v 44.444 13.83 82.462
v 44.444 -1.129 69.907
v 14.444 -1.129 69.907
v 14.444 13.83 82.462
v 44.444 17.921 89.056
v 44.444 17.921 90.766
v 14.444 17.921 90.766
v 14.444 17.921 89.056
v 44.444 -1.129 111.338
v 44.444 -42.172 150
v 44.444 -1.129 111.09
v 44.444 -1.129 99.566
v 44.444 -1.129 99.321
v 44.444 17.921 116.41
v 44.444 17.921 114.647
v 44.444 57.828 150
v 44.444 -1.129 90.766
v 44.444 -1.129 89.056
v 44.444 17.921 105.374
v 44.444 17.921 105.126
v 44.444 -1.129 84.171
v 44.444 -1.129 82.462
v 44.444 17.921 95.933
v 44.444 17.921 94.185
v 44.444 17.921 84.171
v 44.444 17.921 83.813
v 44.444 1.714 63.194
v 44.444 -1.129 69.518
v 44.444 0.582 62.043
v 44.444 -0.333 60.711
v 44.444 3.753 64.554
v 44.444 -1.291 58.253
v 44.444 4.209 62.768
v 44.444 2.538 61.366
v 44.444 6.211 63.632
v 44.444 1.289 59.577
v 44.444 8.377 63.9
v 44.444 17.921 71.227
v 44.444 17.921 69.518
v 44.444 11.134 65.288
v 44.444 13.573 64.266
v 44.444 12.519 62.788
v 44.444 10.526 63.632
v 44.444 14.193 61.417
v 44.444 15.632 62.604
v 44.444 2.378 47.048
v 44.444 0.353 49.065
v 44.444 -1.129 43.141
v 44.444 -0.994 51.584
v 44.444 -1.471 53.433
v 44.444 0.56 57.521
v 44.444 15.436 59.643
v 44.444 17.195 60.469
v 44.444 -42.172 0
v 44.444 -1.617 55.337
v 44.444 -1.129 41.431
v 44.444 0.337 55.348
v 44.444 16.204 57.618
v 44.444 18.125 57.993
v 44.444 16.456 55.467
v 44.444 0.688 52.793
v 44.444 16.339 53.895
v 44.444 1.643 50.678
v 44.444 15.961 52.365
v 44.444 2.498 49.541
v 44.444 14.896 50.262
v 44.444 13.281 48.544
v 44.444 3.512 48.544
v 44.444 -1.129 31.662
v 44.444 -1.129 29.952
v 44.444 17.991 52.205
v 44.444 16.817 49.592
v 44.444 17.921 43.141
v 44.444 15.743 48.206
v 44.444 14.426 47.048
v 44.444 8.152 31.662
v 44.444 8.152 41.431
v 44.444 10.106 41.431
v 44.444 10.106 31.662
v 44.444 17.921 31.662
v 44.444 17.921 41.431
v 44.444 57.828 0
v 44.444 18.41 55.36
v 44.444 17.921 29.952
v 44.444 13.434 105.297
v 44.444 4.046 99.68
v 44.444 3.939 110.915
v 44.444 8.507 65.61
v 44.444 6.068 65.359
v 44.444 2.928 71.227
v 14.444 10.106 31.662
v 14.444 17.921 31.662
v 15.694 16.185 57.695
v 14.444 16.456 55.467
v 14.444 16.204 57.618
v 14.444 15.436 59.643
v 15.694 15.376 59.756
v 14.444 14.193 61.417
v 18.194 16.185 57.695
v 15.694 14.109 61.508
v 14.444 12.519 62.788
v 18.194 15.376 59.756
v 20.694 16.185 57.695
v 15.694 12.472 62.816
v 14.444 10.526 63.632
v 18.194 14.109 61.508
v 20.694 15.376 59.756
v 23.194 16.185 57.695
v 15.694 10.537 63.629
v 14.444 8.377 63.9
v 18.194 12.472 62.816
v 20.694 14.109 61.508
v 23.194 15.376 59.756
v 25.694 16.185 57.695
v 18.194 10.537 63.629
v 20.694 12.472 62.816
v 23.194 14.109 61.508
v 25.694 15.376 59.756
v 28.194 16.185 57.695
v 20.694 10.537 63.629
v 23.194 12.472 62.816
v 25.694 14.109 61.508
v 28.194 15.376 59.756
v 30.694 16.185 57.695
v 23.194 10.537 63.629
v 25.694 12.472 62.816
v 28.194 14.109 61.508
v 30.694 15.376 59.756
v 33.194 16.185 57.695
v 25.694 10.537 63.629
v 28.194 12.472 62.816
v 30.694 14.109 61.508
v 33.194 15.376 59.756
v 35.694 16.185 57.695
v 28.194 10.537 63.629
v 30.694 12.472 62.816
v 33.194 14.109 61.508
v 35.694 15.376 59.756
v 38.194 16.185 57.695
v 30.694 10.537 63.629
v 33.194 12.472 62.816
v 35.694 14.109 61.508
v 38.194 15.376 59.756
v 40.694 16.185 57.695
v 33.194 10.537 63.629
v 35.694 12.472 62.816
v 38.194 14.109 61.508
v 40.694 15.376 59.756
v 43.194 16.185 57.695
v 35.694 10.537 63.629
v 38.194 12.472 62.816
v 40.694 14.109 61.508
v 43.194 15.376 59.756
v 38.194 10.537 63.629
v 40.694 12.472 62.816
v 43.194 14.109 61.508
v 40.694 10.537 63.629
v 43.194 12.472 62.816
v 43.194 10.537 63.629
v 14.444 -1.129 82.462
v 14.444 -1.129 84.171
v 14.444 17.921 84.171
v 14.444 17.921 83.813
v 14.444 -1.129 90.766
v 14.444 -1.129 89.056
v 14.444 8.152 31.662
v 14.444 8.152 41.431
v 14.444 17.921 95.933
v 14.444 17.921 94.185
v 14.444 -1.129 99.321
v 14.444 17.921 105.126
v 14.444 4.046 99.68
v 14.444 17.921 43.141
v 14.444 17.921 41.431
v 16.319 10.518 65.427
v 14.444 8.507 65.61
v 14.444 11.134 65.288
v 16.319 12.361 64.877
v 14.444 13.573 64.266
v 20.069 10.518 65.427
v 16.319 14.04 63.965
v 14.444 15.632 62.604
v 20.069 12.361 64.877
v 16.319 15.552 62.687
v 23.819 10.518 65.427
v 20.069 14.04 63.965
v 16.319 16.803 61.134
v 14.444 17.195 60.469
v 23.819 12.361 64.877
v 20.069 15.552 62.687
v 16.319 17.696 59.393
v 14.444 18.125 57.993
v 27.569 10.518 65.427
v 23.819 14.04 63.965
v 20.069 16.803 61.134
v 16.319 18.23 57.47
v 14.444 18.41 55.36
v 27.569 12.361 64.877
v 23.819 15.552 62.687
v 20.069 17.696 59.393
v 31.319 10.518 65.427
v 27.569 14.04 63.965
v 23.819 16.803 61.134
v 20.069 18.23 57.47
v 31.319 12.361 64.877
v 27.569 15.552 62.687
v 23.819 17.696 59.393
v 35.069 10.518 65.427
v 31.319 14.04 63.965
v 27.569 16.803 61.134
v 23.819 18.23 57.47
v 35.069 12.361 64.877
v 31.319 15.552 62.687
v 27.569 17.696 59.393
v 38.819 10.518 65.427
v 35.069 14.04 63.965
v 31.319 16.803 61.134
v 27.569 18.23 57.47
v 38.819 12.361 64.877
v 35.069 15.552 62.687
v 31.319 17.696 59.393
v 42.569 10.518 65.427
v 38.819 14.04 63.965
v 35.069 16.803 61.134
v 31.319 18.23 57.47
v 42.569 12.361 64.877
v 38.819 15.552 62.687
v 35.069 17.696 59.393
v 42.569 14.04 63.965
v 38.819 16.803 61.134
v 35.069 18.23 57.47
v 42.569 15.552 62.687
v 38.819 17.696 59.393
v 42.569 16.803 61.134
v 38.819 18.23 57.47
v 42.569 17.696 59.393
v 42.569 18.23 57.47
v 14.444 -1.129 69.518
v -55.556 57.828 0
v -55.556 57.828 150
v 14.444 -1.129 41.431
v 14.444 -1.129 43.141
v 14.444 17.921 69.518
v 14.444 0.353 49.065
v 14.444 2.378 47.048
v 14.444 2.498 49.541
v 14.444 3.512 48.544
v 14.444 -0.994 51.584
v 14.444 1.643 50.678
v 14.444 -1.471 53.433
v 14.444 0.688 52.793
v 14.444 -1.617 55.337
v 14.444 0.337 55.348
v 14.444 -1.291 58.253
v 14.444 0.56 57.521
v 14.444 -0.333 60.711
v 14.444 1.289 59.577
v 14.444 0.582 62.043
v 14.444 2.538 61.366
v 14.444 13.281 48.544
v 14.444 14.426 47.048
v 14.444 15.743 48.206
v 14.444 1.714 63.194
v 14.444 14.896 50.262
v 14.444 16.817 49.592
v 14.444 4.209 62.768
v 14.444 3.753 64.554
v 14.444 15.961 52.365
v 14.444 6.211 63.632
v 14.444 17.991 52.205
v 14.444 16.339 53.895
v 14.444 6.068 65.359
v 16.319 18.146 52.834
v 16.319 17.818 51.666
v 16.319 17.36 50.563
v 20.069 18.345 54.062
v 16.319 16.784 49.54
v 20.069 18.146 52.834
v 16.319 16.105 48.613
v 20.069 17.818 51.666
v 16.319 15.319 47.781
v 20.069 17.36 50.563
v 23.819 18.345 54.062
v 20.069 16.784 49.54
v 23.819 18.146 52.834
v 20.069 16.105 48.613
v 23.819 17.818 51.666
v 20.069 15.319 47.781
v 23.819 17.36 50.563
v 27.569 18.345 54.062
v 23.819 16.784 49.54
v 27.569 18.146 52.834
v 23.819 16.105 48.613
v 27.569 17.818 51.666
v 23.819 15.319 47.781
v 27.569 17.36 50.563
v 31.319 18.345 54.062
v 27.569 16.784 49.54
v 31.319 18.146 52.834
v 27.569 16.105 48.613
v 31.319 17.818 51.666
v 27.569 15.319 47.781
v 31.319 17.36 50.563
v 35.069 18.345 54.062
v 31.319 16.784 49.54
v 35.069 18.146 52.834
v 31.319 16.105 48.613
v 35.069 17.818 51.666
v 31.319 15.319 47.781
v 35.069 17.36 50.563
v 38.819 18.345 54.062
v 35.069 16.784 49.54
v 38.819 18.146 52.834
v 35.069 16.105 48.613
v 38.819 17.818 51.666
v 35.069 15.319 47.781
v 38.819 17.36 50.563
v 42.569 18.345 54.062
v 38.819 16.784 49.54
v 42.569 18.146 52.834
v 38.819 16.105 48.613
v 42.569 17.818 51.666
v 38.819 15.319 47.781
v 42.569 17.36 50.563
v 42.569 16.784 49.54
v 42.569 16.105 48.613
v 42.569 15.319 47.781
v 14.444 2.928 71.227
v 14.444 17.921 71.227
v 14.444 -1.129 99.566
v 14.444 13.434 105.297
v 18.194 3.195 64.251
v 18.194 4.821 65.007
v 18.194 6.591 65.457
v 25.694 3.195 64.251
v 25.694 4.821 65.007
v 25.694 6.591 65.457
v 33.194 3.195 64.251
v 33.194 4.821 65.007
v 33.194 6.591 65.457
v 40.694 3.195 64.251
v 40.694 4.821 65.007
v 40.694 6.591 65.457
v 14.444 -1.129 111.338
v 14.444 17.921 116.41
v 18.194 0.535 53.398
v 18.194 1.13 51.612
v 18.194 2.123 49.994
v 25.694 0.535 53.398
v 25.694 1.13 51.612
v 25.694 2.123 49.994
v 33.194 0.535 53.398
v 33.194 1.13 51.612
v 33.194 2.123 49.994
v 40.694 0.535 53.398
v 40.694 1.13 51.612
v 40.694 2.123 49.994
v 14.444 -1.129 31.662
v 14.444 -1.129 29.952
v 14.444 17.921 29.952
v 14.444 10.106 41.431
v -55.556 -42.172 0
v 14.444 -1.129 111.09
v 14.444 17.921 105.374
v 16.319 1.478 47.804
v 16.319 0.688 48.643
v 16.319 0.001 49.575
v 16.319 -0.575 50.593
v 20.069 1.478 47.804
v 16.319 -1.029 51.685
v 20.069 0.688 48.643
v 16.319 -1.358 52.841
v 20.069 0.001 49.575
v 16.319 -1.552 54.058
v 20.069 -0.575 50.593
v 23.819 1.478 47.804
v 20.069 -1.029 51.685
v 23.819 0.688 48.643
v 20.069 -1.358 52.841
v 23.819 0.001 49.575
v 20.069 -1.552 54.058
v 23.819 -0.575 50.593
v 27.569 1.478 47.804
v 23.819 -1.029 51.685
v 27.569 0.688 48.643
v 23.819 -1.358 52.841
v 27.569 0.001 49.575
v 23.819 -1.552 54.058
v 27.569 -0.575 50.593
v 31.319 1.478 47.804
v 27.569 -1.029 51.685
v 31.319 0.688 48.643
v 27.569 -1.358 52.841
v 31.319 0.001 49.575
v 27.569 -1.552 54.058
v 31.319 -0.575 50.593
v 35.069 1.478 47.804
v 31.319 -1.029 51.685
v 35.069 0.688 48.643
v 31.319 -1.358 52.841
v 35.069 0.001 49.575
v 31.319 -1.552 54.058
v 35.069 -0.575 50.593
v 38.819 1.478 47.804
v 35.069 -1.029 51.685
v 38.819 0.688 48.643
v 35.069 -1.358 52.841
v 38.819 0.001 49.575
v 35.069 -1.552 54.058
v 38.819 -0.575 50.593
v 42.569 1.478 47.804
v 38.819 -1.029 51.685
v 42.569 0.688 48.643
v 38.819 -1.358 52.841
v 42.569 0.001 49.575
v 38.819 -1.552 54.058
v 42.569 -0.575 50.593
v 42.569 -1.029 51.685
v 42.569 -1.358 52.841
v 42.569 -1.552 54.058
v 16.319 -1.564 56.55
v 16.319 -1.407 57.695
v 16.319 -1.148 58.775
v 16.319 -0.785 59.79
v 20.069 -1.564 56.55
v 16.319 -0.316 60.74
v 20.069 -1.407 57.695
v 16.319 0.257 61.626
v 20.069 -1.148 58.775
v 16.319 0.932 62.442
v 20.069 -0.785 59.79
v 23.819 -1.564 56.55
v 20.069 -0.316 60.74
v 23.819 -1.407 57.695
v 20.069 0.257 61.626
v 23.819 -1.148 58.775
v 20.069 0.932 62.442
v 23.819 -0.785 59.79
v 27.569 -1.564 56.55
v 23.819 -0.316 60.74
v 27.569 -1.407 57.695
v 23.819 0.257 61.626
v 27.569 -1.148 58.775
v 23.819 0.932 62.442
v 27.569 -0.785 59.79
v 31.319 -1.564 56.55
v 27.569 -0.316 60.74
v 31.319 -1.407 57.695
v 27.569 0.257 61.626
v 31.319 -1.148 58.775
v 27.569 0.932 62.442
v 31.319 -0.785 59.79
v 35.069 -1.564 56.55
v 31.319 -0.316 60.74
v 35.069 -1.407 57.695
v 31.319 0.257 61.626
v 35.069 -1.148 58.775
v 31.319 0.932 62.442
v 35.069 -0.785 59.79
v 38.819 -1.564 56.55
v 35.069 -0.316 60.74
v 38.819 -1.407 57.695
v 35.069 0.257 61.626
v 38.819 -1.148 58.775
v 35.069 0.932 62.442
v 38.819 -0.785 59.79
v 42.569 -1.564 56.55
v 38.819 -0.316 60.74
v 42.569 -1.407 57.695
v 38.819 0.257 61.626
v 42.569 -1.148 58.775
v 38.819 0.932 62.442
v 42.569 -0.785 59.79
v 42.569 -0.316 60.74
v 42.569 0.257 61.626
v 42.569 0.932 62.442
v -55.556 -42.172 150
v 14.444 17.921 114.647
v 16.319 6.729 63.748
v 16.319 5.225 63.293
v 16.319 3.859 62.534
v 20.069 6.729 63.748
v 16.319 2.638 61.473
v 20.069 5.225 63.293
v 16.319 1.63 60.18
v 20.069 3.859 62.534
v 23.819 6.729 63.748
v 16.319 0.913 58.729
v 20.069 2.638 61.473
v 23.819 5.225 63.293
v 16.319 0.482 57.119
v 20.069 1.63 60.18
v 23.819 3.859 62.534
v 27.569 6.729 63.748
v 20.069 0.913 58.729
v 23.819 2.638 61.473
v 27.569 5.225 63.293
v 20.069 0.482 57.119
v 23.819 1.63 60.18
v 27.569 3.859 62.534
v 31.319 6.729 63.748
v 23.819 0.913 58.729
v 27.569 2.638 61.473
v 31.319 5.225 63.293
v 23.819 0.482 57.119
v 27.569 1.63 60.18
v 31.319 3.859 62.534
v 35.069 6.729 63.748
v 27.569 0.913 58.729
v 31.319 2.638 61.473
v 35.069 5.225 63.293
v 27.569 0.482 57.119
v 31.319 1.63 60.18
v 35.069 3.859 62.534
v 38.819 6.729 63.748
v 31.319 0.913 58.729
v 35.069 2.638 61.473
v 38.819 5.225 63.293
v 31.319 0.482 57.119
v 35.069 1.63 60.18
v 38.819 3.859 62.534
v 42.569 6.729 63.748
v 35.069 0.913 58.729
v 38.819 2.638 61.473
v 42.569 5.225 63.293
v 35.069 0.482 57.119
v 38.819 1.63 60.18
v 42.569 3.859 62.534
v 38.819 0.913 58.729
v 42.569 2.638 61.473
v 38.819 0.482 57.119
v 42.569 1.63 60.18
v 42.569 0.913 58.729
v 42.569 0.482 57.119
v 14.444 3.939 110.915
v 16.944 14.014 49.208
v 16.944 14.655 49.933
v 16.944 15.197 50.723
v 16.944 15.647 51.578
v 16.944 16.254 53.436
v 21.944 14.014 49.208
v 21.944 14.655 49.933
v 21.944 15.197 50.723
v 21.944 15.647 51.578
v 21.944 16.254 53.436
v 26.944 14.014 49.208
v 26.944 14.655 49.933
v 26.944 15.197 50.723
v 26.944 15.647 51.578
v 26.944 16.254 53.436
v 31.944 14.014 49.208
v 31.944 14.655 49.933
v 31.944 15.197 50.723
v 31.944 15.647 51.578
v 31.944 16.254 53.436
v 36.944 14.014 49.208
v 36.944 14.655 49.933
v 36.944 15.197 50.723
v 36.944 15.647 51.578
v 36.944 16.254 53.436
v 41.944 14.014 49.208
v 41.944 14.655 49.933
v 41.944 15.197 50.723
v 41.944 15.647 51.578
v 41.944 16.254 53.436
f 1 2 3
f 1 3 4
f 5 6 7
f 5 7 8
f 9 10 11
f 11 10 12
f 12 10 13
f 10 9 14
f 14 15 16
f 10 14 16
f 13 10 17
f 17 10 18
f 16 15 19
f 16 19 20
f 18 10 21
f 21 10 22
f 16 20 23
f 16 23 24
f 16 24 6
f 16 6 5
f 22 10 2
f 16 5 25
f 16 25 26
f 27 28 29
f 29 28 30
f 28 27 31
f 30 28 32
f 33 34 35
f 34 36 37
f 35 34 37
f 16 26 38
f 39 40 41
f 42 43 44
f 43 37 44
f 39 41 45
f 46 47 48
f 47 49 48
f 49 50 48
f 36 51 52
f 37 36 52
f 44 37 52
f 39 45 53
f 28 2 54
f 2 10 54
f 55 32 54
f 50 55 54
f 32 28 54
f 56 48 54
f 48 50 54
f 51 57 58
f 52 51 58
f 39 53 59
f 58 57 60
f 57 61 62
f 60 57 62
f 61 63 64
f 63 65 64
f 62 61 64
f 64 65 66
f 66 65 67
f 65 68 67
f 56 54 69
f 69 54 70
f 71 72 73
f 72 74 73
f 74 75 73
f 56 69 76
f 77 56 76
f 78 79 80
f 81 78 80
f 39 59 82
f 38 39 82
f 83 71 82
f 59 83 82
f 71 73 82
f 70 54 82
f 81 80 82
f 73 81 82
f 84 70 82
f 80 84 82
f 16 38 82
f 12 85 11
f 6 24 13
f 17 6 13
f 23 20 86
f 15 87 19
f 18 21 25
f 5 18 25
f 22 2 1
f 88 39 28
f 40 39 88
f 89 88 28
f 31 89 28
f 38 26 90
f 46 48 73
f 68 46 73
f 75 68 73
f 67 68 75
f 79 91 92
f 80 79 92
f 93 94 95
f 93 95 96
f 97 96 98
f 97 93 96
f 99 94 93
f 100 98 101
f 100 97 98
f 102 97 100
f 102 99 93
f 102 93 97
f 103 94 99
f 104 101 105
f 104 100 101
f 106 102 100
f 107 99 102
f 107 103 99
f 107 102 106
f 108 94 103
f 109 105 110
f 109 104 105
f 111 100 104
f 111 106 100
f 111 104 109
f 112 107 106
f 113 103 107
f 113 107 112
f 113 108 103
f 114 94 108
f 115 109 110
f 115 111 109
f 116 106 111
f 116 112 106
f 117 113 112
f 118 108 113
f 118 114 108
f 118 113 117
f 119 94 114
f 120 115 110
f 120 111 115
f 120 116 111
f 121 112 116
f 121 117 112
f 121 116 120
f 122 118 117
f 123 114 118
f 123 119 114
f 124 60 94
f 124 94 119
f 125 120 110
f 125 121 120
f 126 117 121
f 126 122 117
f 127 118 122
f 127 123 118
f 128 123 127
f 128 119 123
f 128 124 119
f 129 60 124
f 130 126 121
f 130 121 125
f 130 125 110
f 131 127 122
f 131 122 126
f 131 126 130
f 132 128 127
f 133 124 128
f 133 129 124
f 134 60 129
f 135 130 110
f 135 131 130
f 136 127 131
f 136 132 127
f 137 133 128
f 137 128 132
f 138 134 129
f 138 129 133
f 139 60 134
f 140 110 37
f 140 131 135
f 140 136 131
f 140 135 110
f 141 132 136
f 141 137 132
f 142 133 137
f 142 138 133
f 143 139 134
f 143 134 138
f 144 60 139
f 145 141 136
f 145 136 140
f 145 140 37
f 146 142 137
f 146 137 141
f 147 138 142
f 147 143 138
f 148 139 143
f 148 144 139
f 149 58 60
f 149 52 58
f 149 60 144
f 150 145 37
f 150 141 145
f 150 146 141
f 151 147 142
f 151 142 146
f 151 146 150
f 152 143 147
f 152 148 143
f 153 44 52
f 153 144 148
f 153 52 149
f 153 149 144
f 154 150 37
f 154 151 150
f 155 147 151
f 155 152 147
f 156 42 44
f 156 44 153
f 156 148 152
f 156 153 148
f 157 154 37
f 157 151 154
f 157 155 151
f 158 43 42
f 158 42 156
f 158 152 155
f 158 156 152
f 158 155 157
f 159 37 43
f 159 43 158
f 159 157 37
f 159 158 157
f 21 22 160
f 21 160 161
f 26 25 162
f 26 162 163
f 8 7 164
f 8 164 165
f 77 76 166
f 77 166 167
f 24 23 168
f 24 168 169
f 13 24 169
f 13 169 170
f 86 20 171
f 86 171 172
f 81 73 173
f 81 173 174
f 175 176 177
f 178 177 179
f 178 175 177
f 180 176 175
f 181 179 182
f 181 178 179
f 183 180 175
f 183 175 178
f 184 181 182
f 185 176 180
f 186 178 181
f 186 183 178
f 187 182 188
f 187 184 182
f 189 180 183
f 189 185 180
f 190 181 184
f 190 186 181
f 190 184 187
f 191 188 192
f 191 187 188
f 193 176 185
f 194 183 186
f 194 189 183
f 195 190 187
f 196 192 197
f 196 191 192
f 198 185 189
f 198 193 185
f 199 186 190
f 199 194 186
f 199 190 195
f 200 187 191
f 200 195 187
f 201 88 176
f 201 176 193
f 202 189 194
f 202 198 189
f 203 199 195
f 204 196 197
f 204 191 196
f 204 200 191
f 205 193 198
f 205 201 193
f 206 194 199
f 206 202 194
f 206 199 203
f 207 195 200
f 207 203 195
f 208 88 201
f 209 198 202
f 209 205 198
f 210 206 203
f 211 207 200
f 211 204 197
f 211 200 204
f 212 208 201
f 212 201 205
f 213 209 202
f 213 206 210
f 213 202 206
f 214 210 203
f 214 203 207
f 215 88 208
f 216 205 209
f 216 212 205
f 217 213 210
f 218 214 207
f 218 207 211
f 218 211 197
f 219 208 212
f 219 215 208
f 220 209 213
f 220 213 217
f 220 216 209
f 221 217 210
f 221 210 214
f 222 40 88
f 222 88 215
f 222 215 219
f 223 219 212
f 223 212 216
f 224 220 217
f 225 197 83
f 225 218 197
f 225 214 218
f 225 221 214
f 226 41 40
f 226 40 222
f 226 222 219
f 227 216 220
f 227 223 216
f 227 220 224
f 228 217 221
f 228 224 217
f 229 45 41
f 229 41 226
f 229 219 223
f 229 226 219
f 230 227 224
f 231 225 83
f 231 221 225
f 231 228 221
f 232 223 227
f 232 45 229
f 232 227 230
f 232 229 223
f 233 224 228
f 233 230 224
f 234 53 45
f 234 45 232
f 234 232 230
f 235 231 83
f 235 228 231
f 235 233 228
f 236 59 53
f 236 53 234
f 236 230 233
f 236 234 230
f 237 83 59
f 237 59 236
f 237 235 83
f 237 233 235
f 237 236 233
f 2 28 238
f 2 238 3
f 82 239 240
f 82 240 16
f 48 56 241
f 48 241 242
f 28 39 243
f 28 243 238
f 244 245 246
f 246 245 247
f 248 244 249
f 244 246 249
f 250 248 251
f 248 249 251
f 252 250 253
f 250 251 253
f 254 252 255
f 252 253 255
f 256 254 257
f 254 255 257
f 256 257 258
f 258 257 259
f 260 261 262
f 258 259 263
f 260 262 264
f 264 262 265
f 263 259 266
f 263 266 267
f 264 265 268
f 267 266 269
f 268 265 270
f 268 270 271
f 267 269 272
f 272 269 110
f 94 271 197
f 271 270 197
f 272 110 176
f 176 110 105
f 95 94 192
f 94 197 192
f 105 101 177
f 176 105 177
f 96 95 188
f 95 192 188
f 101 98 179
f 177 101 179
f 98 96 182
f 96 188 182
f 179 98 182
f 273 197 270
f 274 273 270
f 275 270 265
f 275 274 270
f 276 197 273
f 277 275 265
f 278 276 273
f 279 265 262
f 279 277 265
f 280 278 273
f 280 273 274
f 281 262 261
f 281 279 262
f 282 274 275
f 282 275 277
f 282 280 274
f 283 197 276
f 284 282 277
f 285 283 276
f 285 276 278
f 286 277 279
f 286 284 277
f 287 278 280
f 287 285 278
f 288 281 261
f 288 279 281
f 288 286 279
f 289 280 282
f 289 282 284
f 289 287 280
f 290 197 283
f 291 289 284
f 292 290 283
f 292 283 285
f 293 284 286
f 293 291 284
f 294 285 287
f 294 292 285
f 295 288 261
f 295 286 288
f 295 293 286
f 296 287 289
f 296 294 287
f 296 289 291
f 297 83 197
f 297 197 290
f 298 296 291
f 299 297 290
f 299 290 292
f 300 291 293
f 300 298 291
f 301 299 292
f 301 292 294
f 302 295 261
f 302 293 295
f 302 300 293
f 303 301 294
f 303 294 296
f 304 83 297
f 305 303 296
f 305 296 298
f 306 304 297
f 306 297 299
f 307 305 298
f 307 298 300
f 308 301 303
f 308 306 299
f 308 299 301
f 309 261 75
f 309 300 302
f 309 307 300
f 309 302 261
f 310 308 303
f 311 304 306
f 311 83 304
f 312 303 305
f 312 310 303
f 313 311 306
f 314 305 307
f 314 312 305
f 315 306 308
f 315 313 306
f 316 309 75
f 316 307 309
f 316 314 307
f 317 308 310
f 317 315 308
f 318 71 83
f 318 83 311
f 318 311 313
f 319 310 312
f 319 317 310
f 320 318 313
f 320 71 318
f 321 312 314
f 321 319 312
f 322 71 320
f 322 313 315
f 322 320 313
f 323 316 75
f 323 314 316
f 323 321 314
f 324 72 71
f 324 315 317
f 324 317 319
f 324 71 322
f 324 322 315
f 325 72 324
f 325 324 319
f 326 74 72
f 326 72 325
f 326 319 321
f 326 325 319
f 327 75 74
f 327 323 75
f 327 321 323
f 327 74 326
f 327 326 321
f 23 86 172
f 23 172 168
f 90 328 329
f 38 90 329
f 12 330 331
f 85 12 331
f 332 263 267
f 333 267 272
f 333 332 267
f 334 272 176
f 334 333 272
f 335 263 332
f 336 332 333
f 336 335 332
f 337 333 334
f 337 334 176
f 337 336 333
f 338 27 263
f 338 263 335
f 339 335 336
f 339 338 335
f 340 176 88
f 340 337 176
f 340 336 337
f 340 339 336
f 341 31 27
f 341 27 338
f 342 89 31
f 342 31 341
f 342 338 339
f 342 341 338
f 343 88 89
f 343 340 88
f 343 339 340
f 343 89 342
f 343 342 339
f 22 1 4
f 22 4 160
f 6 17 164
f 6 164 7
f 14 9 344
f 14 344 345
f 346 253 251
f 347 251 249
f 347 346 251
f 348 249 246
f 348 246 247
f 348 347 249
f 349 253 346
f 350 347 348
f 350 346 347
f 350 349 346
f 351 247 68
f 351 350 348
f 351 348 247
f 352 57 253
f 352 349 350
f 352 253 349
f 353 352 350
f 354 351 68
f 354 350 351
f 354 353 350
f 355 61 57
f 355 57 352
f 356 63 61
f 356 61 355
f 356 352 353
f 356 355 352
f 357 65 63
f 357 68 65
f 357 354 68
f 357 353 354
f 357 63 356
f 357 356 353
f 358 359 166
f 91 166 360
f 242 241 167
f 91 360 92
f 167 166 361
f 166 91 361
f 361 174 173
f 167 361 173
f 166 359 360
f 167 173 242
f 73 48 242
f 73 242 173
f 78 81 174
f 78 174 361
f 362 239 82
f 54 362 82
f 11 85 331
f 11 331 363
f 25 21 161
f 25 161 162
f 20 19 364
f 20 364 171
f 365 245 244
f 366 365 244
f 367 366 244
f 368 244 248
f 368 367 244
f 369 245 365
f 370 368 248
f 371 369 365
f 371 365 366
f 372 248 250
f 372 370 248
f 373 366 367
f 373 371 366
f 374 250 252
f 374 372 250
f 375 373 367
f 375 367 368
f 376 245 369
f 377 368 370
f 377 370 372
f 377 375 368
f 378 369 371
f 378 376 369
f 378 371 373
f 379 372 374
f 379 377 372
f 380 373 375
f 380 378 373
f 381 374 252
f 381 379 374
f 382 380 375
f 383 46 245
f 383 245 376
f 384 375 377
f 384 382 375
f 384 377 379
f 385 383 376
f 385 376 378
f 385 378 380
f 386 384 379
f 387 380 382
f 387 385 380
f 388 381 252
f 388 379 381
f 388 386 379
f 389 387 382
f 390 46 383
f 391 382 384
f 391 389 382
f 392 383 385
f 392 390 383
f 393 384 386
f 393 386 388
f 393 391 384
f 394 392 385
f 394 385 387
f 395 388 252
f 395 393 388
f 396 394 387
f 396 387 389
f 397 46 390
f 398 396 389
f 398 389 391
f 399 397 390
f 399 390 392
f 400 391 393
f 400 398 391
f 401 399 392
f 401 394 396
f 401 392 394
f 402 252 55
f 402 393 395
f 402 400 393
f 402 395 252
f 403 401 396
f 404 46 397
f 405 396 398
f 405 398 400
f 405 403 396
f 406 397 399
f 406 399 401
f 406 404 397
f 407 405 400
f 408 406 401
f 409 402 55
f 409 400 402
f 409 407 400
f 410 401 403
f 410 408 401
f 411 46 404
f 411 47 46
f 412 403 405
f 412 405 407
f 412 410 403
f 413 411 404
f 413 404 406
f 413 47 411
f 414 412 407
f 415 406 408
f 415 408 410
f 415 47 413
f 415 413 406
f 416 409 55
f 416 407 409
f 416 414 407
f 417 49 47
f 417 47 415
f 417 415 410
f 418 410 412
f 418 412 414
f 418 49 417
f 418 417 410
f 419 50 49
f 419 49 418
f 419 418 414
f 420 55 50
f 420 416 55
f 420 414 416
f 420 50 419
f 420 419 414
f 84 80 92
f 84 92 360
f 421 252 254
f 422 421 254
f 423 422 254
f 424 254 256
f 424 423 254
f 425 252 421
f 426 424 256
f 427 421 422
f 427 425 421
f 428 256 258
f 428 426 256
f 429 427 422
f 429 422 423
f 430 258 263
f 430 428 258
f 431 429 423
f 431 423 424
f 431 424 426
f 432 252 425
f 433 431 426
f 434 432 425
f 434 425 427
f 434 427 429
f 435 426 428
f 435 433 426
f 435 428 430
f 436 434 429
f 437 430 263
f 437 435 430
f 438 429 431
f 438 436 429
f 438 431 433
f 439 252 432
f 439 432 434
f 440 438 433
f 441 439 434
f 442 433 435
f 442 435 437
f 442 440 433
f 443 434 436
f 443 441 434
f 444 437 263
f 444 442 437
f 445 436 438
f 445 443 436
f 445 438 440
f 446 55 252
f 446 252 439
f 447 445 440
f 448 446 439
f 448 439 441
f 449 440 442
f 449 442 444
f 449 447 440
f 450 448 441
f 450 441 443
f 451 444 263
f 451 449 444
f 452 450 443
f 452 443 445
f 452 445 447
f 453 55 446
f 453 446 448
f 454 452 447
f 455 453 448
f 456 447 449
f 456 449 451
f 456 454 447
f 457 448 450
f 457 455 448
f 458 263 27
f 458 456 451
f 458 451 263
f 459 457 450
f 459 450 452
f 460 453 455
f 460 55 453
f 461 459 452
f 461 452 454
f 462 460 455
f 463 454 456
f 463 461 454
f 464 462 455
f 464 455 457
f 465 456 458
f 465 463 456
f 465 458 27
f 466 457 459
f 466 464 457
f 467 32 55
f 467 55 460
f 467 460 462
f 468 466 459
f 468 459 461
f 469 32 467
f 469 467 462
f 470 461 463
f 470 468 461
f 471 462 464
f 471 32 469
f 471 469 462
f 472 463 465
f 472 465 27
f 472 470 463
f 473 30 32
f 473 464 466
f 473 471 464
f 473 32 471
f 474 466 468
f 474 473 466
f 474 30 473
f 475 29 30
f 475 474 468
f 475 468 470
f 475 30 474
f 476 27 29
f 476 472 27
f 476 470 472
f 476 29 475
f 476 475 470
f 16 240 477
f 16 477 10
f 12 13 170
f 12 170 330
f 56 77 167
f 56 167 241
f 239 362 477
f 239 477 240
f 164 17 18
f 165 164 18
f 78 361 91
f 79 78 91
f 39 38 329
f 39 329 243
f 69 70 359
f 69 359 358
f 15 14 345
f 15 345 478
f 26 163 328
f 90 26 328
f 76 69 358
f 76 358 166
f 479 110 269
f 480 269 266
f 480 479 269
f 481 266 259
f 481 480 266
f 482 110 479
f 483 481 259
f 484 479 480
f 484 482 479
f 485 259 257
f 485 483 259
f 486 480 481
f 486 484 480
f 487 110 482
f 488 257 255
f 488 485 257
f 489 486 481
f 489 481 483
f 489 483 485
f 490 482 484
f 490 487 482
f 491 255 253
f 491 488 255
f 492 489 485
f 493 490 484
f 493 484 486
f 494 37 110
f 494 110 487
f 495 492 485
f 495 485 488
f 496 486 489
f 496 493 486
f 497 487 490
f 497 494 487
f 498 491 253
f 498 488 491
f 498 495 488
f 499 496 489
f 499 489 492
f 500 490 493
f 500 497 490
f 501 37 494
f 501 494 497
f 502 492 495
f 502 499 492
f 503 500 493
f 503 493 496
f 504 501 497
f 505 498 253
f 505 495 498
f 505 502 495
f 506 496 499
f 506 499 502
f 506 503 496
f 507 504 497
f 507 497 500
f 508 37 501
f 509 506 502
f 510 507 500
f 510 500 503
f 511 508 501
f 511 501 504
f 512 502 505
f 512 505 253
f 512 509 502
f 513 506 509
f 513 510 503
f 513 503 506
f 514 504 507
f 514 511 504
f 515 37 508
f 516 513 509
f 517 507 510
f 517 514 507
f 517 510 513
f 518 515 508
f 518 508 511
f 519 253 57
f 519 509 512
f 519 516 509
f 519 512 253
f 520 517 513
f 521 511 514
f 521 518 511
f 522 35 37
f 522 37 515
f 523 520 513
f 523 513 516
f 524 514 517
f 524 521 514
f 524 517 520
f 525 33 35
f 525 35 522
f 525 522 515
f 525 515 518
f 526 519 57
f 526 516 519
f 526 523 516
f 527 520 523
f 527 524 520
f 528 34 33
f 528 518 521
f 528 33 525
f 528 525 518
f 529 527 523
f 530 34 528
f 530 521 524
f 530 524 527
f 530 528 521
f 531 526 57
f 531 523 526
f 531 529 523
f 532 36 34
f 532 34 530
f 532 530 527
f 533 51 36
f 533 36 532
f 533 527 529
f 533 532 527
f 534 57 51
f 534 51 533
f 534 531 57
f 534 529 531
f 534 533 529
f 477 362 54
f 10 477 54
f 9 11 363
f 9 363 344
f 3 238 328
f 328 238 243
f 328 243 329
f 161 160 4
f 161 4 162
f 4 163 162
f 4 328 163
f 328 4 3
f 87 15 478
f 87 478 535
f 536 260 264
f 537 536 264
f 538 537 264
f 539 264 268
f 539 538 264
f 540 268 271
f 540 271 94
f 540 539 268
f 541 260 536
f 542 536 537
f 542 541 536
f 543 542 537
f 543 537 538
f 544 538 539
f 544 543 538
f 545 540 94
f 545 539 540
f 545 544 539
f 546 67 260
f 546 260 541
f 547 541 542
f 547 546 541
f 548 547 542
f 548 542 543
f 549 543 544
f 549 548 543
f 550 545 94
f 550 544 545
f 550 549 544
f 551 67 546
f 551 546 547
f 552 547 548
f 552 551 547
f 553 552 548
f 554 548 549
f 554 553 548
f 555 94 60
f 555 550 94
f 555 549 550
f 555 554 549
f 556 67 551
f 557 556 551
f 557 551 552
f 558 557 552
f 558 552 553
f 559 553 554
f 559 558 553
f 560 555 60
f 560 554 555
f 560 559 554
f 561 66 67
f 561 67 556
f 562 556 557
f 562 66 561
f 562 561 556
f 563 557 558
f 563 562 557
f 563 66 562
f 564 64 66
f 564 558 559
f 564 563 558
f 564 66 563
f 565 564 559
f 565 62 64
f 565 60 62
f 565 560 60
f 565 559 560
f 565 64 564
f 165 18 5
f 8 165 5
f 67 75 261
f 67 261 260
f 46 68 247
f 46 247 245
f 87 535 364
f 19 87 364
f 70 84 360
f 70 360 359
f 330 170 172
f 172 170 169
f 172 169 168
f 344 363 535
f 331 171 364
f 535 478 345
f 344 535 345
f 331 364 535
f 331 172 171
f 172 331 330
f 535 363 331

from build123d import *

# Parameters (mm, degrees)
SKETCH1_W           = 100
SKETCH1_H           = 100
BOSS_EXTRUDE1_DEPTH = 150
SKETCH2_W           = 1.709615385
SKETCH2_H           = 19.05
CUT_EXTRUDE1_DEPTH  = 30


with BuildPart() as part:
    # Sketch1 → Boss-Extrude1 (new body)
    with BuildSketch(Plane.XY):
        with Locations((-5.555555556, 7.828282828)):
            Rectangle(SKETCH1_W, SKETCH1_H)
    extrude(amount=BOSS_EXTRUDE1_DEPTH)

    # Sketch2 → Cut-Extrude1 (cut)
    with BuildSketch(Plane(origin=(44.444444444, 0, 0), x_dir=(0, 0, -1), z_dir=(1, 0, 0))):
        Polygon((-116.409832449, 17.921320019), (-114.646791584, 17.921320019), (-110.914640142, 3.939108481), (-105.373654565, 17.921320019), (-105.12560769, 17.921320019), (-99.680024757, 4.045959442), (-95.932608892, 17.921320019), (-94.184832449, 17.921320019), (-99.321310815, -1.128679981), (-99.565541584, -1.128679981), (-105.297332449, 13.433579635), (-111.090181007, -1.128679981), (-111.338227882, -1.128679981), align=None)
        with Locations((-89.910793987, 8.396320019)):
            Rectangle(SKETCH2_W, SKETCH2_H)
        Polygon((-84.171370911, -1.128679981), (-84.171370911, 17.921320019), (-83.812656969, 17.921320019), (-71.227140142, 2.927840452), (-71.227140142, 17.921320019), (-69.517524757, 17.921320019), (-69.517524757, -1.128679981), (-69.906767545, -1.128679981), (-82.461755526, 13.830454635), (-82.461755526, -1.128679981), align=None)
        with BuildLine():
            Line((-47.048293988, 14.425767135), (-48.544207449, 13.280935404))
            add(Edge.make_bspline(
                [(-48.544207449, 13.280935404), (-48.650919499, 13.40811304), (-48.862904888, 13.660753681), (-49.203949976, 14.01551663), (-49.559377489, 14.347886125), (-49.929051563, 14.659445498), (-50.3196262, 14.939299609), (-50.721639975, 15.202032326), (-51.141817907, 15.437532443), (-51.722852348, 15.723080981), (-52.482935637, 16.021056482), (-53.439761832, 16.270901213), (-54.438586526, 16.429947897), (-55.120019175, 16.447173677), (-55.466623315, 16.455935404)],
                knots=[0, 0, 0, 0, 0.757959112, 1.505699292, 2.245454638, 2.979532153, 3.711538275, 4.438200793, 5.171680507, 5.909471876, 7.393775596, 8.890124382, 10.418191784, 12, 12, 12, 12], degree=3))
            add(Edge.make_bspline(
                [(-55.466623315, 16.455935404), (-55.657576701, 16.453736694), (-56.037711246, 16.449359679), (-56.601855081, 16.391615726), (-57.155464688, 16.31045614), (-57.698179954, 16.190031167), (-58.229310057, 16.037780197), (-58.752327274, 15.855850444), (-59.259659252, 15.630761959), (-59.758324235, 15.38197843), (-60.23609394, 15.100977623), (-60.6881507, 14.794472094), (-61.112845783, 14.465891726), (-61.510515143, 14.11400499), (-61.881565319, 13.740396605), (-62.223307682, 13.341084974), (-62.534559701, 12.917346716), (-62.821490937, 12.474769454), (-63.0784631, 12.014642331), (-63.293618587, 11.535262305), (-63.484146466, 11.044838544), (-63.634909487, 10.537830083), (-63.7542415, 10.017804458), (-63.83657921, 9.483366026), (-63.89366646, 8.935631284), (-63.898021709, 8.56437774), (-63.900217065, 8.377239491)],
                knots=[0, 0, 0, 0, 1.054917814, 2.100044995, 3.131103042, 4.146048494, 5.169673617, 6.183595914, 7.203665975, 8.234915748, 9.262203917, 10.264457458, 11.251630812, 12.227803204, 13.197192746, 14.159520551, 15.12972552, 16.100847026, 17.073214652, 18.039054194, 19.002613845, 19.979014051, 20.95965708, 21.949030935, 22.966165397, 24, 24, 24, 24], degree=3))
            add(Edge.make_bspline(
                [(-63.900217065, 8.377239491), (-63.893349164, 8.095673306), (-63.879864952, 7.542855452), (-63.759859019, 6.733118271), (-63.577495594, 5.957398604), (-63.304179382, 5.220545462), (-62.967162836, 4.513472828), (-62.541310364, 3.848144211), (-62.048097497, 3.214505482), (-61.480546728, 2.627531723), (-60.857852215, 2.09133559), (-60.189752868, 1.619164568), (-59.477912673, 1.225564993), (-58.7301913, 0.898035913), (-57.94083488, 0.646267152), (-57.111262884, 0.46902528), (-56.243279596, 0.353407126), (-55.650174719, 0.342338052), (-55.348324036, 0.336704635)],
                knots=[0, 0, 0, 0, 1.029171465, 2.020641659, 2.987623507, 3.938342917, 4.889210282, 5.84687017, 6.821220943, 7.821438502, 8.827599549, 9.822697543, 10.807740252, 11.797342354, 12.80366471, 13.83203677, 14.896651826, 16, 16, 16, 16], degree=3))
            add(Edge.make_bspline(
                [(-55.348324036, 0.336704635), (-55.015750829, 0.345896422), (-54.361167199, 0.363988057), (-53.401221227, 0.517254827), (-52.482272274, 0.765764352), (-51.60427091, 1.113551615), (-50.769692336, 1.56566411), (-49.977230513, 2.113748271), (-49.226216536, 2.763017625), (-48.7746157, 3.258770081), (-48.544207449, 3.511704635)],
                knots=[0, 0, 0, 0, 1.028121516, 2.023589091, 2.998037872, 3.967518031, 4.937445131, 5.927275754, 6.942489185, 8, 8, 8, 8], degree=3))
            Line((-48.544207449, 3.511704635), (-47.048293988, 2.378321221))
            add(Edge.make_bspline(
                [(-47.048293988, 2.378321221), (-47.1686797, 2.222990504), (-47.408874484, 1.913073096), (-47.797810262, 1.476165647), (-48.207533838, 1.065207968), (-48.641088488, 0.683513344), (-49.093486754, 0.323444039), (-49.572851768, -0.004770214), (-50.072881788, -0.305710599), (-50.591882595, -0.581265717), (-51.129302759, -0.825743875), (-51.684498326, -1.03504224), (-52.255076173, -1.215336282), (-52.841062383, -1.36366468), (-53.443672431, -1.479440151), (-54.060731725, -1.55683581), (-54.693572046, -1.609859658), (-55.120517495, -1.614692457), (-55.336875719, -1.617141519)],
                knots=[0, 0, 0, 0, 0.986787822, 1.968848986, 2.935600012, 3.899624008, 4.868462664, 5.837806735, 6.815139263, 7.798259679, 8.787526145, 9.778297419, 10.776456485, 11.791383307, 12.812564526, 13.85620153, 14.913611965, 16, 16, 16, 16], degree=3))
            add(Edge.make_bspline(
                [(-55.336875719, -1.617141519), (-55.541764821, -1.615715531), (-55.946907648, -1.612895816), (-56.545070853, -1.567218448), (-57.127399857, -1.504899166), (-57.692230321, -1.411063595), (-58.242644557, -1.300332259), (-58.773652881, -1.151898705), (-59.290480526, -0.985623955), (-59.791051066, -0.790198241), (-60.275790289, -0.569674448), (-60.743134748, -0.320437534), (-61.192869502, -0.044583385), (-61.629416149, 0.251807457), (-62.046325855, 0.578255343), (-62.447211471, 0.930226597), (-62.834320949, 1.306534912), (-63.073821277, 1.577887757), (-63.194237497, 1.714318817)],
                knots=[0, 0, 0, 0, 1.114604814, 2.203992996, 3.262667896, 4.300477797, 5.318619304, 6.316056647, 7.298880507, 8.271930387, 9.238335007, 10.195173496, 11.151986948, 12.108099108, 13.064862484, 14.031167946, 15.010108607, 16, 16, 16, 16], degree=3))
            add(Edge.make_bspline(
                [(-63.194237497, 1.714318817), (-63.387108643, 1.951307289), (-63.770522424, 2.422423098), (-64.261063644, 3.185979653), (-64.680966766, 3.98318519), (-65.020469992, 4.818227945), (-65.285878583, 5.689234153), (-65.469744801, 6.596642881), (-65.589224249, 7.539606681), (-65.602887392, 8.180975488), (-65.609832449, 8.506987087)],
                knots=[0, 0, 0, 0, 0.994628077, 1.977248131, 2.950237994, 3.925870899, 4.908910175, 5.911660606, 6.938484602, 8, 8, 8, 8], degree=3))
            add(Edge.make_bspline(
                [(-65.609832449, 8.506987087), (-65.601367753, 8.849644627), (-65.584713991, 9.523801945), (-65.44322259, 10.513171605), (-65.215608857, 11.46105279), (-64.892320077, 12.365676028), (-64.482443808, 13.231799411), (-63.976113238, 14.05280654), (-63.37921065, 14.833947978), (-62.69641746, 15.563371124), (-61.947658107, 16.230335315), (-61.145822848, 16.817109081), (-60.292481108, 17.305428704), (-59.397033944, 17.713622102), (-58.452776163, 18.02737268), (-57.461722397, 18.247009311), (-56.425734875, 18.383718186), (-55.718912244, 18.401000389), (-55.359772353, 18.409781558)],
                knots=[0, 0, 0, 0, 1.032925535, 2.032216505, 3.007276963, 3.968222605, 4.92396291, 5.891752235, 6.871517503, 7.883894988, 8.900124299, 9.891468569, 10.874487609, 11.85992873, 12.854644235, 13.869047385, 14.917252991, 16, 16, 16, 16], degree=3))
            add(Edge.make_bspline(
                [(-55.359772353, 18.409781558), (-55.140890727, 18.407157349), (-54.707636592, 18.401962991), (-54.066725727, 18.351310988), (-53.442743919, 18.266872646), (-52.835261288, 18.151940895), (-52.241322477, 18.009298188), (-51.66546688, 17.823477421), (-51.104315456, 17.611007158), (-50.561407284, 17.36630465), (-50.039347204, 17.091621386), (-49.538297813, 16.790002064), (-49.062239082, 16.461820608), (-48.607821207, 16.109868182), (-48.18264583, 15.726698881), (-47.774641211, 15.322851966), (-47.397663057, 14.886695008), (-47.164963524, 14.579691011), (-47.048293988, 14.425767135)],
                knots=[0, 0, 0, 0, 1.096760587, 2.17092713, 3.219439832, 4.250915756, 5.268269357, 6.278326846, 7.281116186, 8.274029601, 9.260640565, 10.235837813, 11.203064059, 12.156899882, 13.114053108, 14.069676657, 15.032185724, 16, 16, 16, 16], degree=3))
        make_face()
        Polygon((-43.14060168, 17.921320019), (-41.430986295, 17.921320019), (-41.430986295, 10.105935404), (-31.661755526, 10.105935404), (-31.661755526, 17.921320019), (-29.952140142, 17.921320019), (-29.952140142, -1.128679981), (-31.661755526, -1.128679981), (-31.661755526, 8.15208925), (-41.430986295, 8.15208925), (-41.430986295, -1.128679981), (-43.14060168, -1.128679981), align=None)
    extrude(amount=-CUT_EXTRUDE1_DEPTH, mode=Mode.SUBTRACT)


solid = part.part
